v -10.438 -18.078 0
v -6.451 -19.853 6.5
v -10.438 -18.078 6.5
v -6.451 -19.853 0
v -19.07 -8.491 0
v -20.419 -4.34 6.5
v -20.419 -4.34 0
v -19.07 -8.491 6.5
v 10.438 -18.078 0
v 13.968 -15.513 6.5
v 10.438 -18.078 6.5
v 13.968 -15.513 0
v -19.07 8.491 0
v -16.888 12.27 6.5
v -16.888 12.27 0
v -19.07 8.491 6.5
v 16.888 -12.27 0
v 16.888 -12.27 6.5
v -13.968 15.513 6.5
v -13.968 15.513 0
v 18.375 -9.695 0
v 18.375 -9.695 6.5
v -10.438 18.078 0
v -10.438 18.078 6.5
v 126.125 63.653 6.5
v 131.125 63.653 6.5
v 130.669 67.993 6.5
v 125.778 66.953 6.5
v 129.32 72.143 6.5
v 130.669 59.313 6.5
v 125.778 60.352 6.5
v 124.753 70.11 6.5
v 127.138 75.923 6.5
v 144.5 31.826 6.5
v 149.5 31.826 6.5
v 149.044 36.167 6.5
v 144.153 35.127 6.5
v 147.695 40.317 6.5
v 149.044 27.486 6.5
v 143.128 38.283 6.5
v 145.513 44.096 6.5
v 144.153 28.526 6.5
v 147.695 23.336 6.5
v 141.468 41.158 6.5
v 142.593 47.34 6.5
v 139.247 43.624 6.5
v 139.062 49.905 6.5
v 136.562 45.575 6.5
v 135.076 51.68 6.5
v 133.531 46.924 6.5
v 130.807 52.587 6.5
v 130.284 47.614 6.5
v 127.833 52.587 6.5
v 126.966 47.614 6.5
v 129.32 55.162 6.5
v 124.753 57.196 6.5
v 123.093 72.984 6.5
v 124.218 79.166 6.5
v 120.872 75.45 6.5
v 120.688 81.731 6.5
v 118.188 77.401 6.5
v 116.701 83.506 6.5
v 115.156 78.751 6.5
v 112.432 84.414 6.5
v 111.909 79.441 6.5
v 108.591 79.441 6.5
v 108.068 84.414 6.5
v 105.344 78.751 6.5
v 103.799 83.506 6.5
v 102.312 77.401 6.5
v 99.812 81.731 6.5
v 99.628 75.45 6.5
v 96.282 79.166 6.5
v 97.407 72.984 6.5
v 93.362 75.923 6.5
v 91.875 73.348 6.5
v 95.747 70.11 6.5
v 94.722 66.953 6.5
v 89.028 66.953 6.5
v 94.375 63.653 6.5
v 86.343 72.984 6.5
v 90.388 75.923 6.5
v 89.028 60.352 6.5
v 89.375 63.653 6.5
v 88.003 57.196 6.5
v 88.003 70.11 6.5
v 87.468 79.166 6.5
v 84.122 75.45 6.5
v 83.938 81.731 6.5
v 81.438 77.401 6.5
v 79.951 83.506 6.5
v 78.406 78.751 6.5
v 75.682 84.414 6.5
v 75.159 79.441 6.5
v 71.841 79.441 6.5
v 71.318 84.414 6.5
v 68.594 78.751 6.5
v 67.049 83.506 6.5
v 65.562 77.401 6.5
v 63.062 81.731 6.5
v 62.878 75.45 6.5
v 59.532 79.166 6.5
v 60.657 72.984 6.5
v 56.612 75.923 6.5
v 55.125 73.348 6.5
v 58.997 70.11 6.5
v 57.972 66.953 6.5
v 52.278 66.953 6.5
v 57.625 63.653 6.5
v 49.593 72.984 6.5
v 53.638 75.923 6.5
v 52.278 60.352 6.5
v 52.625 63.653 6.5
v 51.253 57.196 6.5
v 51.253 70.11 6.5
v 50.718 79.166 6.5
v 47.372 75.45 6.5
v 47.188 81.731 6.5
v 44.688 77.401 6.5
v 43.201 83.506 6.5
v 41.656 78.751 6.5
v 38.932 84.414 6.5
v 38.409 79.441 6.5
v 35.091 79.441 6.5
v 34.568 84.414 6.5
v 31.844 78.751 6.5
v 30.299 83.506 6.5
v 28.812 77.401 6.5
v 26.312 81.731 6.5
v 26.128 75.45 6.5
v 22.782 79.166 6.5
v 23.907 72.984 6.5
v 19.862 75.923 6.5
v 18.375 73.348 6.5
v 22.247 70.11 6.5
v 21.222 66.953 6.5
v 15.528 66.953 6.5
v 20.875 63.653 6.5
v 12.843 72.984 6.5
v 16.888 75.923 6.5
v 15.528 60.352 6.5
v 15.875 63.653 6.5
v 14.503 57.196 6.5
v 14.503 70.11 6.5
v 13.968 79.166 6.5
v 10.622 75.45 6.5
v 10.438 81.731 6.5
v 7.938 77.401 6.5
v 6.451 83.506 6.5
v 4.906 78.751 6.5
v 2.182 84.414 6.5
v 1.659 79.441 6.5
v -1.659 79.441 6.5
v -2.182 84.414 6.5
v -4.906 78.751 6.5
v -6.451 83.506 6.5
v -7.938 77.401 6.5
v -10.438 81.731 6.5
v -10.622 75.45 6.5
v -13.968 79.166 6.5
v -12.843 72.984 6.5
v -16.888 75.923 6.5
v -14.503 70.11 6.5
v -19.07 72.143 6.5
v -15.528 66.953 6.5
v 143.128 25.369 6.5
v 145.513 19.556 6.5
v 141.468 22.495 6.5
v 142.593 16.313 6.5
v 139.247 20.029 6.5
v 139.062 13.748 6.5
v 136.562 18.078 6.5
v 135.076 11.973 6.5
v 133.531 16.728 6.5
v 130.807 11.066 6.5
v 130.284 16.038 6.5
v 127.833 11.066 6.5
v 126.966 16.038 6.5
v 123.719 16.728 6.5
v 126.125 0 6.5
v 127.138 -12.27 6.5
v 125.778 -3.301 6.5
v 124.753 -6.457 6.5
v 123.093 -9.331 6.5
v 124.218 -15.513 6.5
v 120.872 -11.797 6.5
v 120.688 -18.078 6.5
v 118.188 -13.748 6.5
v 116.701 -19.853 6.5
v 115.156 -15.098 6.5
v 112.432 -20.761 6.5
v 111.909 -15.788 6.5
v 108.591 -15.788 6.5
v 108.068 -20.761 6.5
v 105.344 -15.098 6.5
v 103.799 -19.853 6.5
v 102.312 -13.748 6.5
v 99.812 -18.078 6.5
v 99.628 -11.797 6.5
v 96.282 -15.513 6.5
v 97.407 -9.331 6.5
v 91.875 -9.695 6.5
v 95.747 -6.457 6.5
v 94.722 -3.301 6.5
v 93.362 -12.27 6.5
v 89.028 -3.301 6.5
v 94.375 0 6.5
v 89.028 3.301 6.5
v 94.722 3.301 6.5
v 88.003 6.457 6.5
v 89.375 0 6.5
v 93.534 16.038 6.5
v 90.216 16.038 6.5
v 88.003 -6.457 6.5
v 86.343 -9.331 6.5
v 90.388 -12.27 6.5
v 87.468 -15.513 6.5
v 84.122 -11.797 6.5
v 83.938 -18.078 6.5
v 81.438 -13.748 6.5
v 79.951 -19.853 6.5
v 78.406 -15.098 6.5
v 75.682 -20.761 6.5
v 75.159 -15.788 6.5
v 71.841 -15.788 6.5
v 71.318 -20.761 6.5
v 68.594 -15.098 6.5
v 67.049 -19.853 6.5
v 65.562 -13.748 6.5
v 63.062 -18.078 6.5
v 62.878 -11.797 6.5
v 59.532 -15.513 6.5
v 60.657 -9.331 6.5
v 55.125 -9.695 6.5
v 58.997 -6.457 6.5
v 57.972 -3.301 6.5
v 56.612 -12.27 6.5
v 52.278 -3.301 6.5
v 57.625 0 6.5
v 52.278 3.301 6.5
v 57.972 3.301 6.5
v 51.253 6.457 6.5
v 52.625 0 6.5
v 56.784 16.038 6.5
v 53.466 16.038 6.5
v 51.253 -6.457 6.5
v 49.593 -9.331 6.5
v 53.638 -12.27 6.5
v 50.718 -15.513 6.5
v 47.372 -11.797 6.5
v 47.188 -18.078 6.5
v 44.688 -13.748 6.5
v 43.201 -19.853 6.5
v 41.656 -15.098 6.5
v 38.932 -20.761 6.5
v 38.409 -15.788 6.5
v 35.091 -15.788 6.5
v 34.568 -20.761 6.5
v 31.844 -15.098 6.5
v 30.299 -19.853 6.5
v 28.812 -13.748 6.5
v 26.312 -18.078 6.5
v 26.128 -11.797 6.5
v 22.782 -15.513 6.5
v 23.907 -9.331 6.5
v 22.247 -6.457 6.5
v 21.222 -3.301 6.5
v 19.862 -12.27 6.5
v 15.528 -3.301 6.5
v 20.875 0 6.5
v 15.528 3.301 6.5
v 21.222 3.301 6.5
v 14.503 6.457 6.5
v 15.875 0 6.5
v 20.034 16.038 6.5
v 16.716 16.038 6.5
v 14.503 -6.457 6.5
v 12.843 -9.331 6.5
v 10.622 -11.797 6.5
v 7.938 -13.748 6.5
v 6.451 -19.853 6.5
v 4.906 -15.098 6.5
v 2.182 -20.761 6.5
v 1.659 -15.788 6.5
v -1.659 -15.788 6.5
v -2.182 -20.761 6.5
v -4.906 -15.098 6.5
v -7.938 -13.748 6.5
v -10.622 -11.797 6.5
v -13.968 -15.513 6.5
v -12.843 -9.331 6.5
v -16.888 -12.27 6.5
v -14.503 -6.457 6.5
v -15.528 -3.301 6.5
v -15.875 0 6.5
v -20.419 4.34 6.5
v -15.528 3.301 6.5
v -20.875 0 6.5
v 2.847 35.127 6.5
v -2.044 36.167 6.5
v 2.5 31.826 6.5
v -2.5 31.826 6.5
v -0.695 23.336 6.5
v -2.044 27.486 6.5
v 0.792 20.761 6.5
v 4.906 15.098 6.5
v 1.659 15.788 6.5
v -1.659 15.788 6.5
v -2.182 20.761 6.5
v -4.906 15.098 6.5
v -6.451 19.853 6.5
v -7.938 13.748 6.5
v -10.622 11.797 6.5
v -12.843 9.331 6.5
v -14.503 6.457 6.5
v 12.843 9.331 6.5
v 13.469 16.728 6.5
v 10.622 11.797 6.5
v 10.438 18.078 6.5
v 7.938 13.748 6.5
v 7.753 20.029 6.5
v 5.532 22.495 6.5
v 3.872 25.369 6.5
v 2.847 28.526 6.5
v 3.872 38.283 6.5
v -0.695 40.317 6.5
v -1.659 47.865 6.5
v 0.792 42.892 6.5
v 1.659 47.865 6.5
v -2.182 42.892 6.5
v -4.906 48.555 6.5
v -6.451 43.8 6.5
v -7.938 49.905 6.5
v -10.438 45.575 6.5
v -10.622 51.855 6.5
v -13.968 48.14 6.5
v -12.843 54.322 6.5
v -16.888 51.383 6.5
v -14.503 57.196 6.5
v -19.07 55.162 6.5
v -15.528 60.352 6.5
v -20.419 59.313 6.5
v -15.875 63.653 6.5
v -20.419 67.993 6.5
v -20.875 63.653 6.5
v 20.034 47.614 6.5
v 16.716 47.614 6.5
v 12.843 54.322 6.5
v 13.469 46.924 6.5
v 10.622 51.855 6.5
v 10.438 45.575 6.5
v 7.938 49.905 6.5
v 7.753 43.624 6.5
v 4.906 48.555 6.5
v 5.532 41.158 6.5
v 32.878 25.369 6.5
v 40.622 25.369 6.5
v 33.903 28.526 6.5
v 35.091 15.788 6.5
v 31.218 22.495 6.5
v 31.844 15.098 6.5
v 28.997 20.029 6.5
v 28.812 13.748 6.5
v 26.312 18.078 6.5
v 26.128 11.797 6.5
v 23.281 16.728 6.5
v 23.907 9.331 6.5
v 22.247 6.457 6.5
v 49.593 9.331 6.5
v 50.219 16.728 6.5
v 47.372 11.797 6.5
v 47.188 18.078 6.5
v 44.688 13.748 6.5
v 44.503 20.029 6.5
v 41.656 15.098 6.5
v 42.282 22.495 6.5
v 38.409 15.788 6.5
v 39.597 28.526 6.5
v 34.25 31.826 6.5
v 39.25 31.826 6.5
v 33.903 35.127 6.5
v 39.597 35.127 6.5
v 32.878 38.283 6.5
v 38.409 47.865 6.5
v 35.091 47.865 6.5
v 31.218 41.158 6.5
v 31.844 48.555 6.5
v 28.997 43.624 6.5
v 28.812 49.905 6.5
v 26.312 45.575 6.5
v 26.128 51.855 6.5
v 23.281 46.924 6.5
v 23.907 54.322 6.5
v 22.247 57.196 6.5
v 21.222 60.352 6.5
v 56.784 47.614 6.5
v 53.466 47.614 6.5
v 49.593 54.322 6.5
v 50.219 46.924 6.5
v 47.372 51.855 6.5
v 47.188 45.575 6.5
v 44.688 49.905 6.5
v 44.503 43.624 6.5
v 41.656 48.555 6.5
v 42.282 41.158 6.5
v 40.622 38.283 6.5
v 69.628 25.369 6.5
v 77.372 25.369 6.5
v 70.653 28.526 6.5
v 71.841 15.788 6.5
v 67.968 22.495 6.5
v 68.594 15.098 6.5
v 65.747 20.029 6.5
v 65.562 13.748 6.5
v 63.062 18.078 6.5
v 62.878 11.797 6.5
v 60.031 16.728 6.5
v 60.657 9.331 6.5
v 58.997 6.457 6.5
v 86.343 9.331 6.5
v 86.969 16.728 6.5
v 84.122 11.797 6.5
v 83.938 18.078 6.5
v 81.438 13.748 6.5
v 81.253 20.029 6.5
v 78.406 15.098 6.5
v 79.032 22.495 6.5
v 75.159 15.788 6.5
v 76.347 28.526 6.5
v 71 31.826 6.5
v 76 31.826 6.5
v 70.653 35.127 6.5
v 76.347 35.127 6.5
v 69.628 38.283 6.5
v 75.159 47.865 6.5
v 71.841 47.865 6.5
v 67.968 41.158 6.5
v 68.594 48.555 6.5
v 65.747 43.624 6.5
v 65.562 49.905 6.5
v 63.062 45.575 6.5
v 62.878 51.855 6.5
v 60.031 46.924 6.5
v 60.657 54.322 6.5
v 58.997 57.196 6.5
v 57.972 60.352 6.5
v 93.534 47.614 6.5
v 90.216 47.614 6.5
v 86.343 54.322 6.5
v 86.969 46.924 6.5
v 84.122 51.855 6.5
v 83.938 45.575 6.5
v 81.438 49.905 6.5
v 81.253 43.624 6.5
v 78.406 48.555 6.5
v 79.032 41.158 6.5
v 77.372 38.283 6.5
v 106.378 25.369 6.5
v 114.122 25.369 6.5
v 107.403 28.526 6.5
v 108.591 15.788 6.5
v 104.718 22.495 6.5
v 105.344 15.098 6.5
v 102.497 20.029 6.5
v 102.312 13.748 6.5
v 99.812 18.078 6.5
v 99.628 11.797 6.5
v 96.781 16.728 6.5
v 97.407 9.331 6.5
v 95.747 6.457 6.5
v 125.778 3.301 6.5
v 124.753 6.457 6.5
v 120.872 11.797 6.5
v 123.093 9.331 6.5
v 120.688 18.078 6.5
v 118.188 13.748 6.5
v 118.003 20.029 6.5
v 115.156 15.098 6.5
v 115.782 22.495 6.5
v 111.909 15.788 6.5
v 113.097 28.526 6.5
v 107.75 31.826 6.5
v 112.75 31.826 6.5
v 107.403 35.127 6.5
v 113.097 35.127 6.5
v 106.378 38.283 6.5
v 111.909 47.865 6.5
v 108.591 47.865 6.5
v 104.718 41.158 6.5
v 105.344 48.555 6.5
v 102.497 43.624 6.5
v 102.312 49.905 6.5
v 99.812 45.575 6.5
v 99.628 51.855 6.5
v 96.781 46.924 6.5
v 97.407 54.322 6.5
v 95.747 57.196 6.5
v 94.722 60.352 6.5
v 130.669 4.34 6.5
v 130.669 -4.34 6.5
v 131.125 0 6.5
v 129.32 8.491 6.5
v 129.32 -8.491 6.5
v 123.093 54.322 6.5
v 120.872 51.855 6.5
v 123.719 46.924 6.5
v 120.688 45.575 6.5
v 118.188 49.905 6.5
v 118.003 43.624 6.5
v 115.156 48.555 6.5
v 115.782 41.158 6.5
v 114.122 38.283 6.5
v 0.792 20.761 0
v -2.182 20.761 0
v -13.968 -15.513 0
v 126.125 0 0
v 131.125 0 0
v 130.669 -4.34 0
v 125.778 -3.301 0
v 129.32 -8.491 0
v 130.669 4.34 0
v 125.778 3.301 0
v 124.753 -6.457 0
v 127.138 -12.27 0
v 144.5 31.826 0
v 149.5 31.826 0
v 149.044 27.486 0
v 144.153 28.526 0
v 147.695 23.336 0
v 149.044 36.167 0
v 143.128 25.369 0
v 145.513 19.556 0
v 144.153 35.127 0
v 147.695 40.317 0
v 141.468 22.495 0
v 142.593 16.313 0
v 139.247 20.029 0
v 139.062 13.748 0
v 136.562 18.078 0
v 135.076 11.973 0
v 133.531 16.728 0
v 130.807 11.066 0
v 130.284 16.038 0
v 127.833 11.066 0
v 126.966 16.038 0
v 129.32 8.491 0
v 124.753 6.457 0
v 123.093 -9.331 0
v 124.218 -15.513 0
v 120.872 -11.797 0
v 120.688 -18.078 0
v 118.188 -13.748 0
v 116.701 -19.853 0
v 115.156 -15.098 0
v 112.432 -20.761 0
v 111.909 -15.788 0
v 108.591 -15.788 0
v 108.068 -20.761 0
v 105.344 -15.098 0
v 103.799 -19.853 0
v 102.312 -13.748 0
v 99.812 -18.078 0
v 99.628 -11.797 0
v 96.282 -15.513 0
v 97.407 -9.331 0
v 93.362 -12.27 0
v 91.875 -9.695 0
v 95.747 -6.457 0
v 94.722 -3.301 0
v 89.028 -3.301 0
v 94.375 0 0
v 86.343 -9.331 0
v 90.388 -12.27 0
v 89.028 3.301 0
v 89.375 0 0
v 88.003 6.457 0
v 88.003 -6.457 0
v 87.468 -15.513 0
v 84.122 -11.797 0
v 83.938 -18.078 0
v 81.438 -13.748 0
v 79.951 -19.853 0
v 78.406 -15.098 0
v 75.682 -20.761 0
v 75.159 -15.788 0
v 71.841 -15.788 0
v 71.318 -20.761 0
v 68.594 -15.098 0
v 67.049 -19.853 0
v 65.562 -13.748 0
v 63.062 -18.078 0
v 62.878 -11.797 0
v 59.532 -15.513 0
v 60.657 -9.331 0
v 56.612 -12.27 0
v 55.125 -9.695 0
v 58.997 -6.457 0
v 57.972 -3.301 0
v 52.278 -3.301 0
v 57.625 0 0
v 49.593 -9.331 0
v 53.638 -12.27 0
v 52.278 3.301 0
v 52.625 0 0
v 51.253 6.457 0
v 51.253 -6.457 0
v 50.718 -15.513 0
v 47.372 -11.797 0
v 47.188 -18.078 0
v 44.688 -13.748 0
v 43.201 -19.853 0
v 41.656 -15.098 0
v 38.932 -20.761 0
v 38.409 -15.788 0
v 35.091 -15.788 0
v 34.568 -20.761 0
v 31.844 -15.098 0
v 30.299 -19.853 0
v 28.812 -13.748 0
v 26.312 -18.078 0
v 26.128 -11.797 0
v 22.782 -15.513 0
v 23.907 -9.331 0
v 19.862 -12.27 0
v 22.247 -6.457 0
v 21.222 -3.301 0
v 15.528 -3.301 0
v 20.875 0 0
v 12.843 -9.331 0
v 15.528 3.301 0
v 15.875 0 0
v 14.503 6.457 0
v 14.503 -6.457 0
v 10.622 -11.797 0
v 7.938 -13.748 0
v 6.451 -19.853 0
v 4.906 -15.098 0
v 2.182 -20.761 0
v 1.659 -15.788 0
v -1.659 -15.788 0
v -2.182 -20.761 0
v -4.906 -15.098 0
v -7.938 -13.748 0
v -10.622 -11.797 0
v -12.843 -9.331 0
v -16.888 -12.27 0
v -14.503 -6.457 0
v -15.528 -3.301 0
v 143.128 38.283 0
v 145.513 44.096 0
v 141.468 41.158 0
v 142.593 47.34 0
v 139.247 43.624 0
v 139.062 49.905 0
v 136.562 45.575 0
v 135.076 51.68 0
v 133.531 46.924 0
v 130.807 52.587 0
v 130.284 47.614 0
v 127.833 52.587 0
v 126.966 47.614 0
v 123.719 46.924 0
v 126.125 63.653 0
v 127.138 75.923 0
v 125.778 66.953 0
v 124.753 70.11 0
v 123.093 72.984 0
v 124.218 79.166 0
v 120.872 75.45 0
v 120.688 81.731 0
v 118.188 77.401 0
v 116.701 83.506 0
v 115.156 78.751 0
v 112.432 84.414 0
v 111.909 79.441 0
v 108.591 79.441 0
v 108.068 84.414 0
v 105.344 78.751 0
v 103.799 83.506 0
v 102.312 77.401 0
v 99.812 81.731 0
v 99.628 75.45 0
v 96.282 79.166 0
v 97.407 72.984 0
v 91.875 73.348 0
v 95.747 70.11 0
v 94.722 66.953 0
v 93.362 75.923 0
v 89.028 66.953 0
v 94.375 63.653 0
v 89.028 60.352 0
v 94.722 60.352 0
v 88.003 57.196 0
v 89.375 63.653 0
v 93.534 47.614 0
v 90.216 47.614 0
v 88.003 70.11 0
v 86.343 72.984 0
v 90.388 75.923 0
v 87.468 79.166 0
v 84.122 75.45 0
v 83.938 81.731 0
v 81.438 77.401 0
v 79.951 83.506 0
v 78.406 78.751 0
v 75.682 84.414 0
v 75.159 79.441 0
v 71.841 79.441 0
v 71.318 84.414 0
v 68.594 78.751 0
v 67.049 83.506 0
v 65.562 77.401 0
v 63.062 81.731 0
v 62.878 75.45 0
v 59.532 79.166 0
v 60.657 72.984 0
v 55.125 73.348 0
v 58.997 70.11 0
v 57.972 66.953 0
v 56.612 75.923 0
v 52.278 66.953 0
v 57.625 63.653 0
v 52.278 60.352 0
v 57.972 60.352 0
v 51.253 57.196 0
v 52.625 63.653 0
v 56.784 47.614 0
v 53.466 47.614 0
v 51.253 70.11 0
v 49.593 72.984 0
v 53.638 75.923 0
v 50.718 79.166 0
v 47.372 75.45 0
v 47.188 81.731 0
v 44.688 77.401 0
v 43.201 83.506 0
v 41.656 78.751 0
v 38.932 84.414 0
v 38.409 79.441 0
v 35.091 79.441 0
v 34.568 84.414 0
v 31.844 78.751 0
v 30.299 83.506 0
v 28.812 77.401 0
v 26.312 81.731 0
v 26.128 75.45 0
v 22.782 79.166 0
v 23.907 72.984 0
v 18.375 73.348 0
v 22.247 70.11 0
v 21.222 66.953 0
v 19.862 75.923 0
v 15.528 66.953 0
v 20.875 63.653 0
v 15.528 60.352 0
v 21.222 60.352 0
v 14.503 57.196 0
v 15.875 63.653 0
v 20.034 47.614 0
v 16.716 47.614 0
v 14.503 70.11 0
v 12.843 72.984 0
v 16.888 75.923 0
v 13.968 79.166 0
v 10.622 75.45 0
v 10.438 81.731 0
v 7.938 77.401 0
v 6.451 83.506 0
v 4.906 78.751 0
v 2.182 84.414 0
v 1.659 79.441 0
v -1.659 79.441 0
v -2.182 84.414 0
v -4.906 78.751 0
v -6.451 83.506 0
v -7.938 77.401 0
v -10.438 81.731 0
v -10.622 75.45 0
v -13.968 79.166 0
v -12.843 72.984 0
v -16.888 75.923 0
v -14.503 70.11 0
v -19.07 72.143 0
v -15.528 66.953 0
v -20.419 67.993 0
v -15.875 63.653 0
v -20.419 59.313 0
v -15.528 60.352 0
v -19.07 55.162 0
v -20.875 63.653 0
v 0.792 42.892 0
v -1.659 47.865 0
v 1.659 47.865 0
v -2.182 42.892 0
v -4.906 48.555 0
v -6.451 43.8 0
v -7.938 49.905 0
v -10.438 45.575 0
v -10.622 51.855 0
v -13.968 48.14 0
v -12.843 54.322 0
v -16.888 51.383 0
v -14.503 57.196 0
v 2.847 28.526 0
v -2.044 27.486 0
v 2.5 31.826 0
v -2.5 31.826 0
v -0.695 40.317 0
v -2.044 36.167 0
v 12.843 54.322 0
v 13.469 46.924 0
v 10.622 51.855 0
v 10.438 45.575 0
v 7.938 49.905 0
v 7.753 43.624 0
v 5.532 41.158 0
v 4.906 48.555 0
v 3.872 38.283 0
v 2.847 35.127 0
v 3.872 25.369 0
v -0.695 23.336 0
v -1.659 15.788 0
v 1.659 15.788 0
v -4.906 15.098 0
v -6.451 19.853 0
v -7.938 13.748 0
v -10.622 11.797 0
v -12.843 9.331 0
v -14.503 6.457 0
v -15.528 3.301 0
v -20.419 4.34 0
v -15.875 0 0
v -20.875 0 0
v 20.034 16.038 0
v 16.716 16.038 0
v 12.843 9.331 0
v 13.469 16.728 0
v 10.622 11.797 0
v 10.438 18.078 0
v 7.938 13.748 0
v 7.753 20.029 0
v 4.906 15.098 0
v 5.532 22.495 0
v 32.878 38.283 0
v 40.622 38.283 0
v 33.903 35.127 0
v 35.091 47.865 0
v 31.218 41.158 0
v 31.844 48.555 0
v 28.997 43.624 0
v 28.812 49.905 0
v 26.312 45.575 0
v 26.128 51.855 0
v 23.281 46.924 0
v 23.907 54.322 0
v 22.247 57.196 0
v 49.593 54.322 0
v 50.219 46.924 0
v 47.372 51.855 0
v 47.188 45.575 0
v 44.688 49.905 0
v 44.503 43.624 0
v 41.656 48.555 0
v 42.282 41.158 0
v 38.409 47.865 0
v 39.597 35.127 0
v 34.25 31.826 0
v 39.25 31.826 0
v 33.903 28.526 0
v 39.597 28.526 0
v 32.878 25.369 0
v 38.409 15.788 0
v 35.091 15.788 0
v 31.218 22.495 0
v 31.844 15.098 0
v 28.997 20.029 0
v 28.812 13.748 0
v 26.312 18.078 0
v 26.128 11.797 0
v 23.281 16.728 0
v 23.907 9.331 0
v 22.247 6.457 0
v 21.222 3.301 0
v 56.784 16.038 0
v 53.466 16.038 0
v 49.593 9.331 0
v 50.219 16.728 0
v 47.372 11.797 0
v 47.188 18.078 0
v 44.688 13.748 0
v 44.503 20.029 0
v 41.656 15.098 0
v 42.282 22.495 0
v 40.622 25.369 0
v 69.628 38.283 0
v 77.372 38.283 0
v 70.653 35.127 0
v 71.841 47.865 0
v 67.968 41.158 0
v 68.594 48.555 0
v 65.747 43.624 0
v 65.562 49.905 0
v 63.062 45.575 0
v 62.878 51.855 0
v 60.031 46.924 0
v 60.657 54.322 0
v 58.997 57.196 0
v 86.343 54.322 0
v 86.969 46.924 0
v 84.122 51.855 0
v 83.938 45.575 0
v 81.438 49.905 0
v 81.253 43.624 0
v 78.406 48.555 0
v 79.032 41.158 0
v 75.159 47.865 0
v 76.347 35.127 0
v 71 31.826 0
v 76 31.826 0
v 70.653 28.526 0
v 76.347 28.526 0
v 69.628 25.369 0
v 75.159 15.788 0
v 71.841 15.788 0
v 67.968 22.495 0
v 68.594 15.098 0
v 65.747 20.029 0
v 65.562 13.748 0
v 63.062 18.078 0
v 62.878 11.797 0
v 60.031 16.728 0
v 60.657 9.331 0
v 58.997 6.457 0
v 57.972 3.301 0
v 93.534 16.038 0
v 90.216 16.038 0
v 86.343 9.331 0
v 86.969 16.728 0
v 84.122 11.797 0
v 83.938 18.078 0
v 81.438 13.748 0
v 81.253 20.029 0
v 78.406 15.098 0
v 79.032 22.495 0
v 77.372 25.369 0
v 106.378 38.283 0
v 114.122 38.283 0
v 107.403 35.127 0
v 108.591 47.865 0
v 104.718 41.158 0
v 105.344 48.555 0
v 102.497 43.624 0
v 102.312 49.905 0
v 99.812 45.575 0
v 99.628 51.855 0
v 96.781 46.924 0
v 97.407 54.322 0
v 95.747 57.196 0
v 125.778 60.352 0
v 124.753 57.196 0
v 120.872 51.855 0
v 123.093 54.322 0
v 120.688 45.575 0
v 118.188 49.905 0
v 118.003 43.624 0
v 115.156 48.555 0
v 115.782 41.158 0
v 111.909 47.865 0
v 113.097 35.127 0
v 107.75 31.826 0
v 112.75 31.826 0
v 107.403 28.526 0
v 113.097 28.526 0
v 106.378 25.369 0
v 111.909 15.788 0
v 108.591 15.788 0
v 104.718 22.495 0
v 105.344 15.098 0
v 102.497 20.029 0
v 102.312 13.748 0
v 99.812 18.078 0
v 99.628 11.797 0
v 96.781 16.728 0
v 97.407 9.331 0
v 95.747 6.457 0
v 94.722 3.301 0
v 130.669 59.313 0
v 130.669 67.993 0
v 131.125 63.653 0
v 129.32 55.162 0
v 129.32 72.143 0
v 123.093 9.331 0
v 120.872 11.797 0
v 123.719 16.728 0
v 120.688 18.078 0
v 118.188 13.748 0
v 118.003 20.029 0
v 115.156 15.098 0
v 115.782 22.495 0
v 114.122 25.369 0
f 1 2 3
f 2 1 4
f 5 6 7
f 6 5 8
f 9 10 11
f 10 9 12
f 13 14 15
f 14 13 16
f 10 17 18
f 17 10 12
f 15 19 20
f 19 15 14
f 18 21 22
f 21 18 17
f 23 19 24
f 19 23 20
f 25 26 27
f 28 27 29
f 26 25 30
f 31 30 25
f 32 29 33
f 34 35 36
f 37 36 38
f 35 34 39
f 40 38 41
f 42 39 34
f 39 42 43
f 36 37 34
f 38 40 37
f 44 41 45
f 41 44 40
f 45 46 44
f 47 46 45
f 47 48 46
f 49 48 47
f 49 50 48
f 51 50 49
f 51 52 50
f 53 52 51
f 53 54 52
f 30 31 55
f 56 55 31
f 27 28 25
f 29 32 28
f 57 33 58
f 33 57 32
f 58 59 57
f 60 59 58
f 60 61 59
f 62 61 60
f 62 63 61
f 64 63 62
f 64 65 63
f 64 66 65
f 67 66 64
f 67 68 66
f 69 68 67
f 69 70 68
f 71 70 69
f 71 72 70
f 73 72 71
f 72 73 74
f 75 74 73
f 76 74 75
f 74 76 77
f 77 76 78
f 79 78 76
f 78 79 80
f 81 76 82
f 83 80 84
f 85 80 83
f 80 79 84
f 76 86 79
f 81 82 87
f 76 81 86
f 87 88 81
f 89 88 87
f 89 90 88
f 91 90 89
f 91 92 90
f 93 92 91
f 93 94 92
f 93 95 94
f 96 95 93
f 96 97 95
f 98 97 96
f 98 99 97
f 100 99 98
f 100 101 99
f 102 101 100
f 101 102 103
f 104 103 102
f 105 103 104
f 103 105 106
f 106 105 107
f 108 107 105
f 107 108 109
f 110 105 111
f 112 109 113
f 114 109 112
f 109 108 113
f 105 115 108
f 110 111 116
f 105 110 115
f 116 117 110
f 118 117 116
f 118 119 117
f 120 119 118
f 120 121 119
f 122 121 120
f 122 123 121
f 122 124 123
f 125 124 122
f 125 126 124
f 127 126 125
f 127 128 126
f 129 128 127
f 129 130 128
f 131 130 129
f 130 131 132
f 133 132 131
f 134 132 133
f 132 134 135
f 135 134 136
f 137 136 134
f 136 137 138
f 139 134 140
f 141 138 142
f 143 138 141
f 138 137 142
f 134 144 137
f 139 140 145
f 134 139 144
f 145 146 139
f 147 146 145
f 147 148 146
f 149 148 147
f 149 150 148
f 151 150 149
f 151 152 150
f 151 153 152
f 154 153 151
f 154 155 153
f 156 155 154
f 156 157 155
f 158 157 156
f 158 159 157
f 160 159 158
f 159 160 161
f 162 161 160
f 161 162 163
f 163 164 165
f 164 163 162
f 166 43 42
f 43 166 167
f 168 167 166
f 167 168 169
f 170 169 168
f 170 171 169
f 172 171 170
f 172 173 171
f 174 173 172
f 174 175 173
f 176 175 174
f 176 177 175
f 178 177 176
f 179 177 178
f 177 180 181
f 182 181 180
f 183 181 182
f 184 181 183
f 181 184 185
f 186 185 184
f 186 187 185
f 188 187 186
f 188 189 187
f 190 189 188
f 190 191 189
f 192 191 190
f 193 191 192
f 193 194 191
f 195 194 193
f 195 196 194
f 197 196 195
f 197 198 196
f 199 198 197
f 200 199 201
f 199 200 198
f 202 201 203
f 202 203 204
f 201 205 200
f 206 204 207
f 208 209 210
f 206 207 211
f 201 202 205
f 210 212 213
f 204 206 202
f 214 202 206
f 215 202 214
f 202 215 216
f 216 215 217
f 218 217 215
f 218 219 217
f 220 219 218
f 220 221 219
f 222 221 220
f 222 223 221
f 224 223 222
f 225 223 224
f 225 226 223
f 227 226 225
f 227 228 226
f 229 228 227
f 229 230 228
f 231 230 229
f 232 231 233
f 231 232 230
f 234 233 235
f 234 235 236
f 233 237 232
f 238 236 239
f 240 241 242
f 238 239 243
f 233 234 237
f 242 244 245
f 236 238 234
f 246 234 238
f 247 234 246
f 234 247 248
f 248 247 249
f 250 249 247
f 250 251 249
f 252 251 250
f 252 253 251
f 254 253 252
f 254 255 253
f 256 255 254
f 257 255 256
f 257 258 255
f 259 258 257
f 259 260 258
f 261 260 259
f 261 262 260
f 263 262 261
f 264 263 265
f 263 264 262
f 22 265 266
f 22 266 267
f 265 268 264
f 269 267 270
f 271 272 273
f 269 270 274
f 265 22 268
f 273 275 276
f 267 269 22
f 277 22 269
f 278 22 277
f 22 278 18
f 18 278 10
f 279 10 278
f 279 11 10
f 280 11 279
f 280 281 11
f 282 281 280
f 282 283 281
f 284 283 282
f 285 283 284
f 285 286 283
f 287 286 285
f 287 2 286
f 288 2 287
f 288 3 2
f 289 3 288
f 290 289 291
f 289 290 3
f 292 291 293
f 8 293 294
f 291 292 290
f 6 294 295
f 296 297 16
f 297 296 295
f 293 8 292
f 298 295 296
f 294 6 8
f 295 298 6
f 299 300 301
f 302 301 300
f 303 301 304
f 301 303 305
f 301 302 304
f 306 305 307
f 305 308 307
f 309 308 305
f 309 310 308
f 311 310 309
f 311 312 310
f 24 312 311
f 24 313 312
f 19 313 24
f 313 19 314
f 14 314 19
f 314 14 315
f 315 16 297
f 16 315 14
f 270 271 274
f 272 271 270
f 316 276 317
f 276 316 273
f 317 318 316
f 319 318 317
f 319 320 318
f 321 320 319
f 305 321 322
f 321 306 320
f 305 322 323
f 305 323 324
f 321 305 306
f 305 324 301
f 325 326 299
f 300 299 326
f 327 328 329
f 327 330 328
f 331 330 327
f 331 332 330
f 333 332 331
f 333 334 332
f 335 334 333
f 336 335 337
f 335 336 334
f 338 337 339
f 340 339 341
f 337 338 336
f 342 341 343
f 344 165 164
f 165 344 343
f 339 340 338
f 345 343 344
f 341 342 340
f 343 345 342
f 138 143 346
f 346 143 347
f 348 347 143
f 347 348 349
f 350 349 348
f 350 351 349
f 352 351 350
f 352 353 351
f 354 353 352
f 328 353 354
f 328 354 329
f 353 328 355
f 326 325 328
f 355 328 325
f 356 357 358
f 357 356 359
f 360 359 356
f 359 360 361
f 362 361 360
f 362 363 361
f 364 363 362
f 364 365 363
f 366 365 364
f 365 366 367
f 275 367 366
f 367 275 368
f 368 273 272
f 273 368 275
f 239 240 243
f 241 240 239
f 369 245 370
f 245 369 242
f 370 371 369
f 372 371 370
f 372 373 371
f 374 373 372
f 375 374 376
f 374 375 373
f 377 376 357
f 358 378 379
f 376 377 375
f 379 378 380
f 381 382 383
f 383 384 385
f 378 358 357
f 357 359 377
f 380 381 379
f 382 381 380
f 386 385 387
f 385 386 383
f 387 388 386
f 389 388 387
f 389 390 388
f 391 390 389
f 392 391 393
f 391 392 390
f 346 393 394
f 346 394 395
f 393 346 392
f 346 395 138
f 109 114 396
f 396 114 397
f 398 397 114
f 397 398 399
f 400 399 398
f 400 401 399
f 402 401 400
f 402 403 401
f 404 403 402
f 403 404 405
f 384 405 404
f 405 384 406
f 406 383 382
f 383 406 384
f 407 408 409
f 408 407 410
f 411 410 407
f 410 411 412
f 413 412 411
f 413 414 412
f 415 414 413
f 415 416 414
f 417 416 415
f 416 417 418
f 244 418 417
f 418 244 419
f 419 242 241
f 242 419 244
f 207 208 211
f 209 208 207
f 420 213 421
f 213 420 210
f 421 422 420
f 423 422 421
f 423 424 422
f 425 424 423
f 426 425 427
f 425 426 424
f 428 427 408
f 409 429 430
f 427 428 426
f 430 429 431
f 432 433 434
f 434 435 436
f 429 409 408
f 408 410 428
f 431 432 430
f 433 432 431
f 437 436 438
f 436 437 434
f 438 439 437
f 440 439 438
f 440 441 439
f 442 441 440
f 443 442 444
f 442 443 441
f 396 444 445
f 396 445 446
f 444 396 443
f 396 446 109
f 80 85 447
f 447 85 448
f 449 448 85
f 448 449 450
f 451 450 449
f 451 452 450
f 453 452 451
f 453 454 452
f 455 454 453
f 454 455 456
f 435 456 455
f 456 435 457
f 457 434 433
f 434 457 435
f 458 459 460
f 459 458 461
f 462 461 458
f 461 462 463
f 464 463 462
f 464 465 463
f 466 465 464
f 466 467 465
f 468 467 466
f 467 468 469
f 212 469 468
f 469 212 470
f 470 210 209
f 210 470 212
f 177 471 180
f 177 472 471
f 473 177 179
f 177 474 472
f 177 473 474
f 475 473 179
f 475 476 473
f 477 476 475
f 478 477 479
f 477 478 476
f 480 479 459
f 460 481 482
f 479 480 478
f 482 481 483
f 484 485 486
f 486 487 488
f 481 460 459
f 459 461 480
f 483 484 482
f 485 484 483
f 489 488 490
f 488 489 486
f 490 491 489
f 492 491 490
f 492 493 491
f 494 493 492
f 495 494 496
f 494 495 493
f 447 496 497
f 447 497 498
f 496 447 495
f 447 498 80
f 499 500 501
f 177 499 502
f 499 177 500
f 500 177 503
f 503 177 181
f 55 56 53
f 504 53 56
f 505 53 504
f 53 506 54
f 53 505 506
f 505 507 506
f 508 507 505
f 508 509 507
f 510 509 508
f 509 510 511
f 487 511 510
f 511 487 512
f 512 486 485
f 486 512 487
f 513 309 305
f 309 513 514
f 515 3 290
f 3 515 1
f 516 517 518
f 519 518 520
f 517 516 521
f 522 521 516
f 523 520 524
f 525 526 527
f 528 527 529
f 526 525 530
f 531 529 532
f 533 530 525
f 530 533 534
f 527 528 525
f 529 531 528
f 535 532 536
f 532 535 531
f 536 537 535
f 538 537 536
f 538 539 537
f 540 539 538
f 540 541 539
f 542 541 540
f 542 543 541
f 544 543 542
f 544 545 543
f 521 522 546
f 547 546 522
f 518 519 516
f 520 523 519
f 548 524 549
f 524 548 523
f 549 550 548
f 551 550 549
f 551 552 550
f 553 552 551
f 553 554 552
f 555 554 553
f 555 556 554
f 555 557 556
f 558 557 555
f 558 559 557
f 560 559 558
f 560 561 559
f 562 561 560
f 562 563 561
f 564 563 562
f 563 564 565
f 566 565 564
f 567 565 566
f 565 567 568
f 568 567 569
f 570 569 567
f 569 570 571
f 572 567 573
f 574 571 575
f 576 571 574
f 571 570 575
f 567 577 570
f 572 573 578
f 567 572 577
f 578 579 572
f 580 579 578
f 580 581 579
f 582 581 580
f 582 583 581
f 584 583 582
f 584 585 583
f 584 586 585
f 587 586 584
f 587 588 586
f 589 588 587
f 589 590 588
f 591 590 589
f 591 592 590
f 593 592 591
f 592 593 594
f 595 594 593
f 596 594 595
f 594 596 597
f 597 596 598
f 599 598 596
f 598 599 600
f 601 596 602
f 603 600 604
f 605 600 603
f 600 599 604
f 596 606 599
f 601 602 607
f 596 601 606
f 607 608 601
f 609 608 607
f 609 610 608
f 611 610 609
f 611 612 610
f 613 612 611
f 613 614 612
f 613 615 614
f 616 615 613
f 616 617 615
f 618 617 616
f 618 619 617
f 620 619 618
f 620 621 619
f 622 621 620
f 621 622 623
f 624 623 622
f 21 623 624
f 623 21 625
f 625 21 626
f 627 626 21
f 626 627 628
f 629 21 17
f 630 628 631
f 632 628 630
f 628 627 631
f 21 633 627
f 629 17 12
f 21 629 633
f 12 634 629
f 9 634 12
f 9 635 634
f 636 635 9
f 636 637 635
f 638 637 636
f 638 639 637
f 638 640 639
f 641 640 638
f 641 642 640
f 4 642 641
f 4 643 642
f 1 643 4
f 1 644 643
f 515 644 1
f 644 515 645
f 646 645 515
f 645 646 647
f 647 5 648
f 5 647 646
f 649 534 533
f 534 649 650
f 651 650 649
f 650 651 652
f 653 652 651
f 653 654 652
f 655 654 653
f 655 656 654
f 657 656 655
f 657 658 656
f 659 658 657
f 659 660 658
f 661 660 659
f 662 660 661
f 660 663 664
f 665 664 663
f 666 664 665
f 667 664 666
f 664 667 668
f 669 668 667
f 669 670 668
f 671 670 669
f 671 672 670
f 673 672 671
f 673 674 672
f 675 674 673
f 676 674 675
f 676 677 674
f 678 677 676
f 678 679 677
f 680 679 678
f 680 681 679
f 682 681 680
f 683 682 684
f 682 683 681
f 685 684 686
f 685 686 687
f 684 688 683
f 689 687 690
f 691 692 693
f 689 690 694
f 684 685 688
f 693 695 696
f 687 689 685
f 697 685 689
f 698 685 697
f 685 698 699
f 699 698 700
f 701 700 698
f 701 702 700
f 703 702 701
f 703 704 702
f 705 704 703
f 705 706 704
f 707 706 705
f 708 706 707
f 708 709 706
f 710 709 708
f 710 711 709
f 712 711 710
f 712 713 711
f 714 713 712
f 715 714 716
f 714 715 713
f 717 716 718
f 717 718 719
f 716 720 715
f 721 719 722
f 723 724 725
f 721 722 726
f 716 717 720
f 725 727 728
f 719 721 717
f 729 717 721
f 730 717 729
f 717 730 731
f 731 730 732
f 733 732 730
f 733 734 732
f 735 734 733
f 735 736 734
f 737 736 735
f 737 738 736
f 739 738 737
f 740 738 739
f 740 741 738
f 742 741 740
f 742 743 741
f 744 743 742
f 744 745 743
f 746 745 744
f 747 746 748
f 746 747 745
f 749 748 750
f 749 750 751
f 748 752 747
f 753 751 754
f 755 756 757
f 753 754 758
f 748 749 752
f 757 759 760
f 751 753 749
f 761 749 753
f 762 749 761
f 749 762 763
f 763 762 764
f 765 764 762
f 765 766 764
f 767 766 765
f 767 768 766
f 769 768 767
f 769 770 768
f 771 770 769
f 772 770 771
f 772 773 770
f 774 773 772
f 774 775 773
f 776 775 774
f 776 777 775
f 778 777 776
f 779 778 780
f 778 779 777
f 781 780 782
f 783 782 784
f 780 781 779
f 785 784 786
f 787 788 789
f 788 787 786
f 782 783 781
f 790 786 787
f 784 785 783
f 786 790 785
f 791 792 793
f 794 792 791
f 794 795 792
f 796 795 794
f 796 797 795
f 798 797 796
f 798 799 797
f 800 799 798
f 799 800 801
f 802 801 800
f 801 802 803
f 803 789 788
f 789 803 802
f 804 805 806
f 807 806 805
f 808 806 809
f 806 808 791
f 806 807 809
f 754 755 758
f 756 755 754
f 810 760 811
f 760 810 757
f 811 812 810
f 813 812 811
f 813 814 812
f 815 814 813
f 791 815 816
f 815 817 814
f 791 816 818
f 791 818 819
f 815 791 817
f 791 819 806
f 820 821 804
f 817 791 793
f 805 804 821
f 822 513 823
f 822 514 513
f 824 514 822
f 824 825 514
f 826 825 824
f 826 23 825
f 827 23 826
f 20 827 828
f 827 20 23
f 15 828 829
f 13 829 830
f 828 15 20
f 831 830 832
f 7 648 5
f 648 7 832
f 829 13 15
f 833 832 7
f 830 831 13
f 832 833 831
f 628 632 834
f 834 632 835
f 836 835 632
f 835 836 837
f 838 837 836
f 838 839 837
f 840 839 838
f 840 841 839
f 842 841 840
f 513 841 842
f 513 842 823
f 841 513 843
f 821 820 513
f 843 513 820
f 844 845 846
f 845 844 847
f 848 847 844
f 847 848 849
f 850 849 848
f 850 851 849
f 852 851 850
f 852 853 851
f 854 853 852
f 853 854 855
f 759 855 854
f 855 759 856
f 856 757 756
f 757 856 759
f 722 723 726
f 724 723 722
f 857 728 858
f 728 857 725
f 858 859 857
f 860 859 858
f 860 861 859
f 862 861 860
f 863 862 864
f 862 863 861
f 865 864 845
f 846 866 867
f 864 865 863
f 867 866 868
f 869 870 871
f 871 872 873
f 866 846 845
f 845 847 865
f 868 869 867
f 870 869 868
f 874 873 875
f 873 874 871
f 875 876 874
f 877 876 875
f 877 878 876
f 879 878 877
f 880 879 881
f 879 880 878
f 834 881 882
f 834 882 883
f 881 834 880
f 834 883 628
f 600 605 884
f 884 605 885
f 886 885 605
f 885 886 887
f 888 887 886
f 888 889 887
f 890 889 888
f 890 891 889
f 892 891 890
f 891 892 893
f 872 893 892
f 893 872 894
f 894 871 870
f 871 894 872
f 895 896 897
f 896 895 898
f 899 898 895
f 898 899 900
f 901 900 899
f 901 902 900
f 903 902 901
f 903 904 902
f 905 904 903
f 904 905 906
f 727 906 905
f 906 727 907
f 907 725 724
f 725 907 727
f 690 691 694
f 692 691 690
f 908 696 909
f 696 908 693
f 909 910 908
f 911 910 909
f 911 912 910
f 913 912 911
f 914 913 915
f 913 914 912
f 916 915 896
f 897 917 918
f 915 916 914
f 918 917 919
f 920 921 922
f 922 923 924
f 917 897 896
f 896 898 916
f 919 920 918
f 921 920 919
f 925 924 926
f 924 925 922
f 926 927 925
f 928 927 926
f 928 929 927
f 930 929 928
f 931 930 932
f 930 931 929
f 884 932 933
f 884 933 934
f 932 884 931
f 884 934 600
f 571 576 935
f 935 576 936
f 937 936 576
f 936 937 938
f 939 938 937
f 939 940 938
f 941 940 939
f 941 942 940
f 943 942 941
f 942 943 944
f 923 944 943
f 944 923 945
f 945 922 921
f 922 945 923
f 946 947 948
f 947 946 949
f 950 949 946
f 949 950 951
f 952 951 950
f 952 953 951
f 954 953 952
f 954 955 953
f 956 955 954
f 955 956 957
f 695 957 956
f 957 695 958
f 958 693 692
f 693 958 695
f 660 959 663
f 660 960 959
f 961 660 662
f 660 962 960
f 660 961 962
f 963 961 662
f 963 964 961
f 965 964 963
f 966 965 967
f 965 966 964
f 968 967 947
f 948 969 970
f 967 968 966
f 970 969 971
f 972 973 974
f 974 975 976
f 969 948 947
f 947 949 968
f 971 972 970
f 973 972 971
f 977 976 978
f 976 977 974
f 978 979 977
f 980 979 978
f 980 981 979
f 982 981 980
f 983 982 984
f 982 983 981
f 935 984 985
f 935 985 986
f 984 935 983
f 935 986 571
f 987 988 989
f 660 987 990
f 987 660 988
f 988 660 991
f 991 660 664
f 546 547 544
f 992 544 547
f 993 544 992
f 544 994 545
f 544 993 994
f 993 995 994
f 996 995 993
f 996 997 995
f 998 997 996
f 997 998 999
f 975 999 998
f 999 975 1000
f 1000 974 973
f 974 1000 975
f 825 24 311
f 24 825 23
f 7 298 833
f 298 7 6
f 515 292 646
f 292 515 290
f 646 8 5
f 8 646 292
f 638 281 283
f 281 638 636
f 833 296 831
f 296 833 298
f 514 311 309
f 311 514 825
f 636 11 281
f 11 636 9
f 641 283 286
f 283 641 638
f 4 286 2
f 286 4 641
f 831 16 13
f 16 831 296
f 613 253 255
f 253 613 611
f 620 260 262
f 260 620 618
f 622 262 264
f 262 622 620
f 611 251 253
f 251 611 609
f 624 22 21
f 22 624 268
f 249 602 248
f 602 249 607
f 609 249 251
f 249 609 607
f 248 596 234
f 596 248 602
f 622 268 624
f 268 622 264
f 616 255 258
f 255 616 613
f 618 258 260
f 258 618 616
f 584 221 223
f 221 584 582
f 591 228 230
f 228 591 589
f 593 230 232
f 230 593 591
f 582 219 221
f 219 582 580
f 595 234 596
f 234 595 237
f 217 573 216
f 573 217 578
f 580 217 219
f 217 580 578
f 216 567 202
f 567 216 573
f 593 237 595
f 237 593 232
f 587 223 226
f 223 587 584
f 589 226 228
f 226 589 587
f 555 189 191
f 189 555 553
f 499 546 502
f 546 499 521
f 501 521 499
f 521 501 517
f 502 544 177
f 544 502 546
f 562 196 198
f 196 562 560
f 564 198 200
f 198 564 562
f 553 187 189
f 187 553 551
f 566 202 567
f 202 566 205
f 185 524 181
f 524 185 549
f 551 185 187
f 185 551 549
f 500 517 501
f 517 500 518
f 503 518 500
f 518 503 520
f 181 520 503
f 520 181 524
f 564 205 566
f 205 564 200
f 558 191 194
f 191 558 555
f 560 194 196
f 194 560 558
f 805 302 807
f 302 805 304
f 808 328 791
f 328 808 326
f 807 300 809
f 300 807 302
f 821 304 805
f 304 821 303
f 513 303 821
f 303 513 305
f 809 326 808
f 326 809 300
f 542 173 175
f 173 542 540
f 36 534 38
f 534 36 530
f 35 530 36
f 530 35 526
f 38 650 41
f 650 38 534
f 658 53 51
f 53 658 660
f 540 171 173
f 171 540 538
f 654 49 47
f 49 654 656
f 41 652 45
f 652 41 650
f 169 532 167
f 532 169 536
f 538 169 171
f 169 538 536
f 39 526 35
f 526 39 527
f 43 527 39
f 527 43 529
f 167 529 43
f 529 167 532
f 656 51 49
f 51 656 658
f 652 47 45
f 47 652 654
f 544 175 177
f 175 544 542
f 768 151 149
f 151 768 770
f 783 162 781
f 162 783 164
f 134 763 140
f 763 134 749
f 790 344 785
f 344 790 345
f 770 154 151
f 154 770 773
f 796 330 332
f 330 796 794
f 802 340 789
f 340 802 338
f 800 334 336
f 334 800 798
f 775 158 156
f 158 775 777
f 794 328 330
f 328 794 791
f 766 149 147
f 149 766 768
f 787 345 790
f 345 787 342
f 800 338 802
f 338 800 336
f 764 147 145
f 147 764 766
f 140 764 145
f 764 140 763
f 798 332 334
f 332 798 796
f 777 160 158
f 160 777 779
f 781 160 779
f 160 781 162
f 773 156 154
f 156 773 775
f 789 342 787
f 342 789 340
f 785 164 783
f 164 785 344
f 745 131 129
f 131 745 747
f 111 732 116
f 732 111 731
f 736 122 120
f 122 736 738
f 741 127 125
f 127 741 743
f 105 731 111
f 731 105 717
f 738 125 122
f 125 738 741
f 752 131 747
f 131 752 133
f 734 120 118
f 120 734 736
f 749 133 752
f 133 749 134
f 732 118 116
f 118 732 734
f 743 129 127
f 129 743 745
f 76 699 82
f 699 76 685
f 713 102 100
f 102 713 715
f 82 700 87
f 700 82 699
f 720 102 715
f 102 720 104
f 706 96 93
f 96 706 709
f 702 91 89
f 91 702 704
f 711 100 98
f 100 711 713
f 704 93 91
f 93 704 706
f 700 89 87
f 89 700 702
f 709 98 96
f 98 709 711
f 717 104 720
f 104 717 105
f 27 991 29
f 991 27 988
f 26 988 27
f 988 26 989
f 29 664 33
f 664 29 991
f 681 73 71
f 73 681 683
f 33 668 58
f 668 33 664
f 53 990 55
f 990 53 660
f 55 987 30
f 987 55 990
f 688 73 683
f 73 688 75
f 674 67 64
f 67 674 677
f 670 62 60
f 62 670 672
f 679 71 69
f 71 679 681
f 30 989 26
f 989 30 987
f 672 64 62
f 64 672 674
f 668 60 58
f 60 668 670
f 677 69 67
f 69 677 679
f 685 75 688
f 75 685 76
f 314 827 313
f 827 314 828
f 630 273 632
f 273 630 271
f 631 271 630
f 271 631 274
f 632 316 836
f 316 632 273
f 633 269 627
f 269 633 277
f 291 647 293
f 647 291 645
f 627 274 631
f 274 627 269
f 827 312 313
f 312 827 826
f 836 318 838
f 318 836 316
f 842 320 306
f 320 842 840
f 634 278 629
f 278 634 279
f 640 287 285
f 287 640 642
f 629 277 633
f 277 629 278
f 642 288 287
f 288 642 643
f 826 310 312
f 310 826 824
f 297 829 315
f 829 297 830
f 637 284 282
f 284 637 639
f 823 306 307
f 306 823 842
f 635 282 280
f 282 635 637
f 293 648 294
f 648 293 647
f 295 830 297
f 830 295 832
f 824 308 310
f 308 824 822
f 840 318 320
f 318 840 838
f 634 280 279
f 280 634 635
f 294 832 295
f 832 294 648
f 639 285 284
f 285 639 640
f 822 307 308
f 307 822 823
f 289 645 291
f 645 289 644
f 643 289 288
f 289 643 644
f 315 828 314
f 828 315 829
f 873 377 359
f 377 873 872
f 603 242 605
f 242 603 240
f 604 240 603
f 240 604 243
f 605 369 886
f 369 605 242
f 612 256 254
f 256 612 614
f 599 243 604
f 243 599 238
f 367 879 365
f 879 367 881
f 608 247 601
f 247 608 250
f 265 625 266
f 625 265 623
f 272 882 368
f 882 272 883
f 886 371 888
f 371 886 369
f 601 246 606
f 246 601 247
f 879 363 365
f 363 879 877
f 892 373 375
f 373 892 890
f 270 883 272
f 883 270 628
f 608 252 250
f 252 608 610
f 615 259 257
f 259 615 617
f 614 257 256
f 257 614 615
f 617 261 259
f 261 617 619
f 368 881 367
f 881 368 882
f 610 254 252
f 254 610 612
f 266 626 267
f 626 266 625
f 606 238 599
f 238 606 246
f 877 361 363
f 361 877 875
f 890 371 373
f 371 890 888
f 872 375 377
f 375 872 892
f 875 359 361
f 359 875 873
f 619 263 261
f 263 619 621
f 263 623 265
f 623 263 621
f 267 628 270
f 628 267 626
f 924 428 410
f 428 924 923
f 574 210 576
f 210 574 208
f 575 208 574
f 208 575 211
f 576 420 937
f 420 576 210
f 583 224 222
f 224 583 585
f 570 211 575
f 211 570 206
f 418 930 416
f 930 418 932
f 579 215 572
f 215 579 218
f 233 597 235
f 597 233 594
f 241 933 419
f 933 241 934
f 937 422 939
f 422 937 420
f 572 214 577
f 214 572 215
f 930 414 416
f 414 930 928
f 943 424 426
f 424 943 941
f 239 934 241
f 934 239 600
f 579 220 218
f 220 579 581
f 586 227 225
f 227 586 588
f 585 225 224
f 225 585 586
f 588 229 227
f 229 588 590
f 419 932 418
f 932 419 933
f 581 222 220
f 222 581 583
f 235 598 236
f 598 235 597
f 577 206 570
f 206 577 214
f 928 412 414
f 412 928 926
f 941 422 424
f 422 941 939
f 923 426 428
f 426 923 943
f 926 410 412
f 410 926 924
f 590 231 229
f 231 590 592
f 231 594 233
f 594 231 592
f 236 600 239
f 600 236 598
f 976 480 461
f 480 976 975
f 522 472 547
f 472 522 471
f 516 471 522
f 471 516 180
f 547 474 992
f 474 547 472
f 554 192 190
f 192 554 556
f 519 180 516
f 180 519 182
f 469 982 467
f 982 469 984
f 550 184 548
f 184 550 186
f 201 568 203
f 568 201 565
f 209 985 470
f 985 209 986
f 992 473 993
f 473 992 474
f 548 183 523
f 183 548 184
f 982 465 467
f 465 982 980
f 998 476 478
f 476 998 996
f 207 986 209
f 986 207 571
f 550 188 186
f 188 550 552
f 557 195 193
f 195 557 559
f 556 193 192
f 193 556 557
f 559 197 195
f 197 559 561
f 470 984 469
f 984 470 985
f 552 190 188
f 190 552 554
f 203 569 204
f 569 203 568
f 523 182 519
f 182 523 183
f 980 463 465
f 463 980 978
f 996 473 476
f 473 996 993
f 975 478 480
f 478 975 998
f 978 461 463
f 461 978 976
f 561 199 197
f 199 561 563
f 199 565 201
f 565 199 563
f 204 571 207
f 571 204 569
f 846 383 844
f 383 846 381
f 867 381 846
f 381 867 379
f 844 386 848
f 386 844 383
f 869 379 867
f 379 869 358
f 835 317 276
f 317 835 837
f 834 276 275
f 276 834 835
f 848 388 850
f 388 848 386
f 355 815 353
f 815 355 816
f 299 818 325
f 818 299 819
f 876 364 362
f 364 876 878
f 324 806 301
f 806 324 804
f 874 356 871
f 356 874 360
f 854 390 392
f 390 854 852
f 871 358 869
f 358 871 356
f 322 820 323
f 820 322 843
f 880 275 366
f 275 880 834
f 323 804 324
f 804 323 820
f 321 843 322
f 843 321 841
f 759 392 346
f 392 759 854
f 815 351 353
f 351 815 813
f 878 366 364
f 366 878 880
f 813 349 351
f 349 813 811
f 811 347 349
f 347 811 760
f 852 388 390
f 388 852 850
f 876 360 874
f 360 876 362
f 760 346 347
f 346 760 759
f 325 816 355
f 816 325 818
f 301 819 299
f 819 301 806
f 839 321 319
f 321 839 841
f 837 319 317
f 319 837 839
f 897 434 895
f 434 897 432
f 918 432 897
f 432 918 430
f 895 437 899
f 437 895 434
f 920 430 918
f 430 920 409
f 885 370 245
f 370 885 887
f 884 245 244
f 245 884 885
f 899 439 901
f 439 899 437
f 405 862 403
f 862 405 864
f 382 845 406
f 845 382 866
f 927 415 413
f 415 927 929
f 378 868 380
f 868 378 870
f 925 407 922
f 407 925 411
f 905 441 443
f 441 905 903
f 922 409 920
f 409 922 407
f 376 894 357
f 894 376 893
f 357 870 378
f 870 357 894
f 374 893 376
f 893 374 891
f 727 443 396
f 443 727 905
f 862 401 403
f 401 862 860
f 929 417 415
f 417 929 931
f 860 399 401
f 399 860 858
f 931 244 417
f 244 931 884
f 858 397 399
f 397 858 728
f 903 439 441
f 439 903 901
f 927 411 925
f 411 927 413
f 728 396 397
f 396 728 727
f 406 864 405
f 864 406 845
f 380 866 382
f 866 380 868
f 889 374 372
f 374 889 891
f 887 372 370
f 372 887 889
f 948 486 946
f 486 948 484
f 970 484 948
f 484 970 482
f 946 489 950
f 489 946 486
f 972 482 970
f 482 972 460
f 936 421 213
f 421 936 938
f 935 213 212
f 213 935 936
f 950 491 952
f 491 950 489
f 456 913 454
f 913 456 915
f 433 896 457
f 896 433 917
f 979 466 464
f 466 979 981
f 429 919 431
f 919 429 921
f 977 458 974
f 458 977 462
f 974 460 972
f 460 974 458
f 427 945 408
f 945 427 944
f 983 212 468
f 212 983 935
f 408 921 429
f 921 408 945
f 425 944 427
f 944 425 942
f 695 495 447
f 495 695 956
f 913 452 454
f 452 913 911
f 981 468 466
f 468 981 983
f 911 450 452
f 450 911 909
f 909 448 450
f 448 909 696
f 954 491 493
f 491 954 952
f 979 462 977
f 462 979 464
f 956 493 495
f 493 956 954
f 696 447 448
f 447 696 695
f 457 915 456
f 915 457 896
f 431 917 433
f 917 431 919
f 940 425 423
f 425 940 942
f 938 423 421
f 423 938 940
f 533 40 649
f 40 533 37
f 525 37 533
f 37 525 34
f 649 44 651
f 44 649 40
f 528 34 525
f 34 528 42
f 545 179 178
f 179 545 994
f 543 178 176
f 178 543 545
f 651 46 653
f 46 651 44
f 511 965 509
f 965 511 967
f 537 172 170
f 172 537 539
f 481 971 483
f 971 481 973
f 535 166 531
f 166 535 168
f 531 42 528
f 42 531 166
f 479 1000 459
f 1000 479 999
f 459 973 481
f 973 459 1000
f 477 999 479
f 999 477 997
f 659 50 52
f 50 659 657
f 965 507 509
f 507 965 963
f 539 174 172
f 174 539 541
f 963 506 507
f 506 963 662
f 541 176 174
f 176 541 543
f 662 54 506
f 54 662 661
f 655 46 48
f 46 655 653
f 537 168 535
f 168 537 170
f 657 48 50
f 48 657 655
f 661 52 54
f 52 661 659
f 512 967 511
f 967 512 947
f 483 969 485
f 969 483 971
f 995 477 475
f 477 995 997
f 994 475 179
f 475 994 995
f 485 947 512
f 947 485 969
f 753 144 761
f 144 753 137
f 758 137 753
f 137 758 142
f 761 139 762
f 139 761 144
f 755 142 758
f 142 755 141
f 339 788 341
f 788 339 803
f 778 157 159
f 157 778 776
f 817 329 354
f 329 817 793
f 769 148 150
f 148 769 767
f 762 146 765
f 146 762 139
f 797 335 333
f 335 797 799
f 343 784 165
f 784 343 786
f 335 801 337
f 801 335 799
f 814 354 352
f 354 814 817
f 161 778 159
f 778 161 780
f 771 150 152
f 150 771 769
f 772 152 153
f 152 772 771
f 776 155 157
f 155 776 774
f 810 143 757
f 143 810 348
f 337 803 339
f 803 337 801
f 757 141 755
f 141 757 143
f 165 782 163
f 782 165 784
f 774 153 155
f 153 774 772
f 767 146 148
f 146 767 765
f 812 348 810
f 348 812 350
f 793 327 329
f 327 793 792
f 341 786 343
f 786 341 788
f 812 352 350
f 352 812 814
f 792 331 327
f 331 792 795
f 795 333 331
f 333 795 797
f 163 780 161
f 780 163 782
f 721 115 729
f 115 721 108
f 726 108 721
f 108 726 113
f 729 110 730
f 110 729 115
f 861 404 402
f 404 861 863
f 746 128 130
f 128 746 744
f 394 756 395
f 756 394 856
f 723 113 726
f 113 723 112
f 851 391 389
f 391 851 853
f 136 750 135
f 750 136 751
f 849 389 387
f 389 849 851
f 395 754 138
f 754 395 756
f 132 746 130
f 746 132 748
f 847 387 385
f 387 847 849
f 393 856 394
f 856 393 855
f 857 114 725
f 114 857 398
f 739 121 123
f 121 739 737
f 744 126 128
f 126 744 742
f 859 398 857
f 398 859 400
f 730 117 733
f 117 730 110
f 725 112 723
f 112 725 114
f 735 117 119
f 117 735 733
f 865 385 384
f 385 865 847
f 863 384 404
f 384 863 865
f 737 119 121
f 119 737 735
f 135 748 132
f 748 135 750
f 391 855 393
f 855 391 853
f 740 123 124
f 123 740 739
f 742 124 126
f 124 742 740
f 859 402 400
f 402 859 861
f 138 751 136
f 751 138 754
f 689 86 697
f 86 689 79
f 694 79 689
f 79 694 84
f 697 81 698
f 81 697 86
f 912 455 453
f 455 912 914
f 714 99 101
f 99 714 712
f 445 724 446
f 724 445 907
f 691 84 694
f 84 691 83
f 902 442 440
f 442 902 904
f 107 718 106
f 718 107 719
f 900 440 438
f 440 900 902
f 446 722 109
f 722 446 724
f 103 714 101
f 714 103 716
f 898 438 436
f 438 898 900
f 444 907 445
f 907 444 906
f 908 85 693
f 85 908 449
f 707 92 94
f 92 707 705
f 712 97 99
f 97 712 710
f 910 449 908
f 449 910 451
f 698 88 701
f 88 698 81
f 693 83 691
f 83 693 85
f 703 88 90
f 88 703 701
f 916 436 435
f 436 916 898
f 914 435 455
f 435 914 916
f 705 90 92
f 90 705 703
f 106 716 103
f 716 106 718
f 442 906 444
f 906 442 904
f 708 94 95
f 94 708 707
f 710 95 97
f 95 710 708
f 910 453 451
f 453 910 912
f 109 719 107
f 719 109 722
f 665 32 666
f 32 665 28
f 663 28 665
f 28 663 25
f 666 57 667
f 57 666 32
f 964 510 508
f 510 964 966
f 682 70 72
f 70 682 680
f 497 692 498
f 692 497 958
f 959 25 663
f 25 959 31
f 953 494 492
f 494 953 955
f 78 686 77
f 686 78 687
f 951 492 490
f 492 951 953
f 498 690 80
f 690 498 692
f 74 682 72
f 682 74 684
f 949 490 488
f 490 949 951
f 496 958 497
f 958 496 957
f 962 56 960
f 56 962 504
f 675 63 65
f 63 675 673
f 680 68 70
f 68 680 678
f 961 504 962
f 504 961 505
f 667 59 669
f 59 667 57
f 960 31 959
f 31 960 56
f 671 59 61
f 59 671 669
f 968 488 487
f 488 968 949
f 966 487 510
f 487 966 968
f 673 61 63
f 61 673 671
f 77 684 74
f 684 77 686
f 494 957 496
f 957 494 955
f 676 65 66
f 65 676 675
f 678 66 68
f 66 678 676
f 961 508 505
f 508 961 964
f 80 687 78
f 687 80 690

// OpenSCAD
/* [Hidden] */
inches = 25.4;
$fs = 1.0;


/* [Bottle Holder] */
rows = 3;
columns = 4;

// The diameter of the holes that will hold bottles.
diameter = 31.75;

// How much spacing is between the edges of the holes.
// If your bottle has lids, don't forget to account for the lid overhang!
gap = 5.0;

// How tall the bottle holder will be.
height = 6.5;

// If the offset rows should have one fewer columns.
// This allows for the whole shape to fit nicely in a rectangle.
smaller_offsets = 0; // [0,1]

// The thickness of the outer loops as a percent of the inner gap.
padding_scale = 1.0; // [1:0.05:2]


// Things I have found useful:
// Film Canisters:
//   diameter = 1.25 * inches
// Medicine Bottles:
//   diameter = 1.25 * inches
//   gap >= 0.45 * inches
// Ikea IHARDIG Spice Jars:
//   diameter = 65.5
// AA Battery Holder:
//   diameter = 14.75
// AAA Battery Holder:
//   diameter = 10.5



function int(bool) = (bool ? 1 : 0);

module HexPack(rows, columns, spacing, smaller_offsets = false) {
    // rows             How many rows of duplicated children.
    // columns          How many columns of duplicated children.
    // spacing          How far the children should be spaced from each other.
    // smaller_offsets  If the offset rows should have one fewer columns.
    //                  This allows for the whole shape to fit nicely in a rectangle.

    // Assuming the objects are hexagonally packed,
    //   this is how far their center points are from each other.
    // We can find the y spacing of the center points using the Pythagorean theorem because
    //   the center points between three adjacent circles will form an equilateral triangle.
    // Shortcut:
    //   The side length is half the hypotenuse, so...
    //   sqrt(hypot^2 - side^2)
    //   => sqrt((side * 2)^2 - side^2)
    //   => sqrt(4 * side^2 - side^2)
    //   => sqrt(3 * side^2)
    //   => sqrt(3) * side
    hex_x_spacing = spacing;
    hex_y_spacing = sqrt(3) * (spacing / 2);

    for ( row = [0 : max(1, rows - 1)] ) {
        is_offset = ( row % 2 );
        offset_shrinkage = int(smaller_offsets) * is_offset;

        // Offset rows are translated over one half a spacing.
        x_offset = (is_offset * (hex_x_spacing / 2));
        y_offset = (row * hex_y_spacing);

        for ( column = [0 : max(0, columns - offset_shrinkage - 1)] ) {
            cur_x_offset = x_offset + (column * hex_x_spacing);
            translate([cur_x_offset, y_offset, 0]) children();
        }
    }
}


module BottleHolder(rows, columns, diameter, gap, height, padding_scale = 1.0, smaller_offsets = false) {
    // rows             Number of rows of holes.
    // columns          Number of columns of holes.
    // diameter         The diameter of the holes that will hold bottles.
    // gap              How much spacing is between the edges of the holes.
    //                  If your bottles have lids, don't forget to account for them!
    // height           How tall the bottle holder will be.
    // padding_scale    The thickness of the outer loops as a percent of the inner gap.
    // smaller_offsets  If the offset rows should have one fewer columns.
    //                  This allows for the whole shape to fit nicely in a rectangle.

    outer_diameter = (diameter + gap);

    difference() {
        union() {
            // Structural cylinders that holes will be cut from.
            HexPack(rows, columns, outer_diameter, smaller_offsets)
                cylinder(height, d = diameter + (2 * gap * padding_scale));

            // Filling any gaps between the inner cylinders.
            // Try making this transparent (with %) to see why it's necessary.
            offset_shrinkage = int(smaller_offsets) * (outer_diameter / 2);
            translate([diameter / 4, 0, 0])
                cube([
                    (columns - 1) * outer_diameter - offset_shrinkage,
                    (rows - 1) * sqrt(3) * (outer_diameter / 2),
                    height
                ]);
        }

        // Cutting holes in the structural cylinders to make loops
        HexPack(rows, columns, outer_diameter, smaller_offsets)
            cylinder(height, d = diameter);
    }
}

// preview[view:south, tilt:top]
BottleHolder(
    rows     = rows,
    columns  = columns,
    diameter = diameter,
    height   = height,
    gap      = gap,
    smaller_offsets = smaller_offsets,
    padding_scale   = padding_scale
);
